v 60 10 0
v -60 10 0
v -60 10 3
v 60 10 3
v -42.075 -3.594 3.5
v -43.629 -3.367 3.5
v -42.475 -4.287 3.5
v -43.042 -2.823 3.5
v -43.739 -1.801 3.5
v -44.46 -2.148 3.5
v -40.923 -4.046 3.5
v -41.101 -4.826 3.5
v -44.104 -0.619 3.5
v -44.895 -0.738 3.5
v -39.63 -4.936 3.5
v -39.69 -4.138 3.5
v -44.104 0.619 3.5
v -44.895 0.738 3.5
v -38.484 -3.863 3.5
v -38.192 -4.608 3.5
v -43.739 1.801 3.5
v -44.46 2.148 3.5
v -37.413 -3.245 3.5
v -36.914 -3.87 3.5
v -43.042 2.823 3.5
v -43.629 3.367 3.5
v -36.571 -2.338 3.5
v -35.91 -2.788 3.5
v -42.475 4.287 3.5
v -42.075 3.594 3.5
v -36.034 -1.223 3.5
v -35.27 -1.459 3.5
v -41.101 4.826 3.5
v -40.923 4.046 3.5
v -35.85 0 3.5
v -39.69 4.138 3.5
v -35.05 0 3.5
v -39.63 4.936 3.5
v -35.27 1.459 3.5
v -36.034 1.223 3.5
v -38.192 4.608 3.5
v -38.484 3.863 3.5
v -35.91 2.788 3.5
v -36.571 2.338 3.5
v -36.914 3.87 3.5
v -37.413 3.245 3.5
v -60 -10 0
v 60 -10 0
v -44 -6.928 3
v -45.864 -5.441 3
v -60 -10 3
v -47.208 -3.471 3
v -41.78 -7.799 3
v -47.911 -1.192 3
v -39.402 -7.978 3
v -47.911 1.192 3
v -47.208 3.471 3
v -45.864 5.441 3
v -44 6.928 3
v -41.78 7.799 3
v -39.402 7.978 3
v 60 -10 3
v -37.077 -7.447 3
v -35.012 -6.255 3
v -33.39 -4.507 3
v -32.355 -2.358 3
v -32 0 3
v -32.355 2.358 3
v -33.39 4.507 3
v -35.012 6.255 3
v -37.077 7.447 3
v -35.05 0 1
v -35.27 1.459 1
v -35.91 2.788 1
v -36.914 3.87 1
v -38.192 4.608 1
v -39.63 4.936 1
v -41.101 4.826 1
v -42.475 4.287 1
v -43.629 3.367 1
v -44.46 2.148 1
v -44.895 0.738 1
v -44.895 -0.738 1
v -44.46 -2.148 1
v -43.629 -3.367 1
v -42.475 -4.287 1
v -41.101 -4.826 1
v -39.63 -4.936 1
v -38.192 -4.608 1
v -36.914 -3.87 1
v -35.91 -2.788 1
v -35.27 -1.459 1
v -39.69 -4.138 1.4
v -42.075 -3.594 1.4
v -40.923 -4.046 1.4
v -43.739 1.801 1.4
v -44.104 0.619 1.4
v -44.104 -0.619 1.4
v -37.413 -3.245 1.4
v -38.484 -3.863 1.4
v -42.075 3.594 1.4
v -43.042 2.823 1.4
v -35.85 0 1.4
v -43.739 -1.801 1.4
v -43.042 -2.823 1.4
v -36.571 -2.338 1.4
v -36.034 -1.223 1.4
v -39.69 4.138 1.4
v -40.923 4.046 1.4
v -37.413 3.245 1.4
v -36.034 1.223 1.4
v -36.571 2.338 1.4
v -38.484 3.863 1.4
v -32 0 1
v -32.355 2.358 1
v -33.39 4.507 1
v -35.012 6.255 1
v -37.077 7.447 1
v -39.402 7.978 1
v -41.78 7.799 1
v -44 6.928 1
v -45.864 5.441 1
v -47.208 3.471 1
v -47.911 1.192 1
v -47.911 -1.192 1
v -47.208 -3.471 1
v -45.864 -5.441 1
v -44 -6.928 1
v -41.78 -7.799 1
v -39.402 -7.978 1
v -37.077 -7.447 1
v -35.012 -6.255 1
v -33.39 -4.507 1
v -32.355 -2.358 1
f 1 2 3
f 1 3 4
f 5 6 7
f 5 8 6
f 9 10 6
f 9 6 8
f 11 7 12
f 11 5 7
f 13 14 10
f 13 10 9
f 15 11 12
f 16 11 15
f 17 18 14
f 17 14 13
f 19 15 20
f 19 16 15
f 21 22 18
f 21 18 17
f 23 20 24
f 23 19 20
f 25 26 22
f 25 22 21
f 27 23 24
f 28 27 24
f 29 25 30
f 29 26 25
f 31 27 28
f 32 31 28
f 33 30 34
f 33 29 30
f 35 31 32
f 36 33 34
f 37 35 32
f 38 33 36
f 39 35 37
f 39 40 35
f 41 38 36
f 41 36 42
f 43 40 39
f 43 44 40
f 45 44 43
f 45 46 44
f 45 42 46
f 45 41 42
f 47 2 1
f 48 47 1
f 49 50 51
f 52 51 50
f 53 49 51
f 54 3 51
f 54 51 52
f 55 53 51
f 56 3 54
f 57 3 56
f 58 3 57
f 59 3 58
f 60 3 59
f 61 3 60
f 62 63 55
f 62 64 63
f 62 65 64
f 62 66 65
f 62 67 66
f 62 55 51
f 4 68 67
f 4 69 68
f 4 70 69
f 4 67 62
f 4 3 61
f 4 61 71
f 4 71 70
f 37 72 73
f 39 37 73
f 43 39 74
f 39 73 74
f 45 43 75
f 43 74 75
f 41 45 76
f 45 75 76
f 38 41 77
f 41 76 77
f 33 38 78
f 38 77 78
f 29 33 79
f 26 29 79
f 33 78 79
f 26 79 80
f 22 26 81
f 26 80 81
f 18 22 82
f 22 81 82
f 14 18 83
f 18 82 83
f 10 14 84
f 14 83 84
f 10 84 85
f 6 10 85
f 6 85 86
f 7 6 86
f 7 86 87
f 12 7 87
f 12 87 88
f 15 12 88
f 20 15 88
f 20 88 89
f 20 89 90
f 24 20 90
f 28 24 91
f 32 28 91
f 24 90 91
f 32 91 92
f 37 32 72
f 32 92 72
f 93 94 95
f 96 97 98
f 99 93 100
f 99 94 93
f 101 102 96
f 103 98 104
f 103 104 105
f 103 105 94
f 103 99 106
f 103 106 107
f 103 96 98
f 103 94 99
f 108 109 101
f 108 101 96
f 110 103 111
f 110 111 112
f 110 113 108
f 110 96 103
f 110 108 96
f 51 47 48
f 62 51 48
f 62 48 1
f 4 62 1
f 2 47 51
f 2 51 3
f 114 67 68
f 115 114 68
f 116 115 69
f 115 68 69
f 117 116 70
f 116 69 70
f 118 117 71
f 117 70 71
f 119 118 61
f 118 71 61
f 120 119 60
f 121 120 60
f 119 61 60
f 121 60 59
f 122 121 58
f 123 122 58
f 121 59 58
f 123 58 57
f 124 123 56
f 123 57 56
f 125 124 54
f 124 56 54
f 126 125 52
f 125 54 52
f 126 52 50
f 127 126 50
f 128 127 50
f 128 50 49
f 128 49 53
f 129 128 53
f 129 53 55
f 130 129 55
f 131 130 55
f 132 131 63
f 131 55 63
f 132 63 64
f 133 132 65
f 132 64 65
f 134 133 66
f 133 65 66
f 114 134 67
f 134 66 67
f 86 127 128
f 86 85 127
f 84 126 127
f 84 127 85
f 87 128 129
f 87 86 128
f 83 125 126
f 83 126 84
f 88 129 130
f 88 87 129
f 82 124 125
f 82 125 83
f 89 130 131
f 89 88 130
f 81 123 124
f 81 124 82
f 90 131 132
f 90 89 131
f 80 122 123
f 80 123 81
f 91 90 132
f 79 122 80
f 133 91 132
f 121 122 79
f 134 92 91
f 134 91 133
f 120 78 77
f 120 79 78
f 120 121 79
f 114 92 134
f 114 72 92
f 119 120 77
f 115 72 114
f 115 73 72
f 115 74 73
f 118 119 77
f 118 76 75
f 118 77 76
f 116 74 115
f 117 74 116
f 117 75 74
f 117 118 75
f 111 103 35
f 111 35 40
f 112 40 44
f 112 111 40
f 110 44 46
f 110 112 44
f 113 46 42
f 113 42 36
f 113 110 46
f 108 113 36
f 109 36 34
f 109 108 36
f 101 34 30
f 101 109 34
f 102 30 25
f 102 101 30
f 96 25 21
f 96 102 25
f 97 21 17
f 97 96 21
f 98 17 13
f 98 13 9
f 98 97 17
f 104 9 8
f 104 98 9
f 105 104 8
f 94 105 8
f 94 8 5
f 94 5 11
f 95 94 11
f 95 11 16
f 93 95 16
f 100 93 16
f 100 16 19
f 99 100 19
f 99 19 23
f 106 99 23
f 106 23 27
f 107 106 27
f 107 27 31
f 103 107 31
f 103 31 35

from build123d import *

# Parameters (mm, degrees)
F0_W      = 120
F0_H      = 20
F1_DEPTH  = 3
F2_R      = 8
F3_DEPTH  = 2
F4_R      = 4.95
F4_R_2    = 4.15
F5_DEPTH  = 2.5
F5_FACE_R = 4.15
F6_DEPTH  = 0.4


with BuildPart() as f1:
    # F0 (on Top) → F1 (new body)
    with BuildSketch(Plane.XY):
        Rectangle(F0_W, F0_H)
    extrude(amount=F1_DEPTH)

    # F2 (on face) → F3 (cut)
    with BuildSketch(Plane.XY.offset(3)):
        with Locations((-40, 0)):
            Circle(F2_R)
    extrude(amount=-F3_DEPTH, mode=Mode.SUBTRACT)

    # F4 (on face) → F5 (join)
    with BuildSketch(Plane.XY.offset(1)):
        with Locations((-40, 0)):
            Circle(F4_R)
        with Locations((-40, 0)):
            Circle(F4_R_2, mode=Mode.SUBTRACT)
    extrude(amount=F5_DEPTH)

    # F5_face (on face) → F6 (join)
    with BuildSketch(Plane(origin=(-40, 0, 1), x_dir=(1, 0, 0), z_dir=(0, 0, 1))):
        Circle(F5_FACE_R)
    extrude(amount=F6_DEPTH)


solid = f1.part
